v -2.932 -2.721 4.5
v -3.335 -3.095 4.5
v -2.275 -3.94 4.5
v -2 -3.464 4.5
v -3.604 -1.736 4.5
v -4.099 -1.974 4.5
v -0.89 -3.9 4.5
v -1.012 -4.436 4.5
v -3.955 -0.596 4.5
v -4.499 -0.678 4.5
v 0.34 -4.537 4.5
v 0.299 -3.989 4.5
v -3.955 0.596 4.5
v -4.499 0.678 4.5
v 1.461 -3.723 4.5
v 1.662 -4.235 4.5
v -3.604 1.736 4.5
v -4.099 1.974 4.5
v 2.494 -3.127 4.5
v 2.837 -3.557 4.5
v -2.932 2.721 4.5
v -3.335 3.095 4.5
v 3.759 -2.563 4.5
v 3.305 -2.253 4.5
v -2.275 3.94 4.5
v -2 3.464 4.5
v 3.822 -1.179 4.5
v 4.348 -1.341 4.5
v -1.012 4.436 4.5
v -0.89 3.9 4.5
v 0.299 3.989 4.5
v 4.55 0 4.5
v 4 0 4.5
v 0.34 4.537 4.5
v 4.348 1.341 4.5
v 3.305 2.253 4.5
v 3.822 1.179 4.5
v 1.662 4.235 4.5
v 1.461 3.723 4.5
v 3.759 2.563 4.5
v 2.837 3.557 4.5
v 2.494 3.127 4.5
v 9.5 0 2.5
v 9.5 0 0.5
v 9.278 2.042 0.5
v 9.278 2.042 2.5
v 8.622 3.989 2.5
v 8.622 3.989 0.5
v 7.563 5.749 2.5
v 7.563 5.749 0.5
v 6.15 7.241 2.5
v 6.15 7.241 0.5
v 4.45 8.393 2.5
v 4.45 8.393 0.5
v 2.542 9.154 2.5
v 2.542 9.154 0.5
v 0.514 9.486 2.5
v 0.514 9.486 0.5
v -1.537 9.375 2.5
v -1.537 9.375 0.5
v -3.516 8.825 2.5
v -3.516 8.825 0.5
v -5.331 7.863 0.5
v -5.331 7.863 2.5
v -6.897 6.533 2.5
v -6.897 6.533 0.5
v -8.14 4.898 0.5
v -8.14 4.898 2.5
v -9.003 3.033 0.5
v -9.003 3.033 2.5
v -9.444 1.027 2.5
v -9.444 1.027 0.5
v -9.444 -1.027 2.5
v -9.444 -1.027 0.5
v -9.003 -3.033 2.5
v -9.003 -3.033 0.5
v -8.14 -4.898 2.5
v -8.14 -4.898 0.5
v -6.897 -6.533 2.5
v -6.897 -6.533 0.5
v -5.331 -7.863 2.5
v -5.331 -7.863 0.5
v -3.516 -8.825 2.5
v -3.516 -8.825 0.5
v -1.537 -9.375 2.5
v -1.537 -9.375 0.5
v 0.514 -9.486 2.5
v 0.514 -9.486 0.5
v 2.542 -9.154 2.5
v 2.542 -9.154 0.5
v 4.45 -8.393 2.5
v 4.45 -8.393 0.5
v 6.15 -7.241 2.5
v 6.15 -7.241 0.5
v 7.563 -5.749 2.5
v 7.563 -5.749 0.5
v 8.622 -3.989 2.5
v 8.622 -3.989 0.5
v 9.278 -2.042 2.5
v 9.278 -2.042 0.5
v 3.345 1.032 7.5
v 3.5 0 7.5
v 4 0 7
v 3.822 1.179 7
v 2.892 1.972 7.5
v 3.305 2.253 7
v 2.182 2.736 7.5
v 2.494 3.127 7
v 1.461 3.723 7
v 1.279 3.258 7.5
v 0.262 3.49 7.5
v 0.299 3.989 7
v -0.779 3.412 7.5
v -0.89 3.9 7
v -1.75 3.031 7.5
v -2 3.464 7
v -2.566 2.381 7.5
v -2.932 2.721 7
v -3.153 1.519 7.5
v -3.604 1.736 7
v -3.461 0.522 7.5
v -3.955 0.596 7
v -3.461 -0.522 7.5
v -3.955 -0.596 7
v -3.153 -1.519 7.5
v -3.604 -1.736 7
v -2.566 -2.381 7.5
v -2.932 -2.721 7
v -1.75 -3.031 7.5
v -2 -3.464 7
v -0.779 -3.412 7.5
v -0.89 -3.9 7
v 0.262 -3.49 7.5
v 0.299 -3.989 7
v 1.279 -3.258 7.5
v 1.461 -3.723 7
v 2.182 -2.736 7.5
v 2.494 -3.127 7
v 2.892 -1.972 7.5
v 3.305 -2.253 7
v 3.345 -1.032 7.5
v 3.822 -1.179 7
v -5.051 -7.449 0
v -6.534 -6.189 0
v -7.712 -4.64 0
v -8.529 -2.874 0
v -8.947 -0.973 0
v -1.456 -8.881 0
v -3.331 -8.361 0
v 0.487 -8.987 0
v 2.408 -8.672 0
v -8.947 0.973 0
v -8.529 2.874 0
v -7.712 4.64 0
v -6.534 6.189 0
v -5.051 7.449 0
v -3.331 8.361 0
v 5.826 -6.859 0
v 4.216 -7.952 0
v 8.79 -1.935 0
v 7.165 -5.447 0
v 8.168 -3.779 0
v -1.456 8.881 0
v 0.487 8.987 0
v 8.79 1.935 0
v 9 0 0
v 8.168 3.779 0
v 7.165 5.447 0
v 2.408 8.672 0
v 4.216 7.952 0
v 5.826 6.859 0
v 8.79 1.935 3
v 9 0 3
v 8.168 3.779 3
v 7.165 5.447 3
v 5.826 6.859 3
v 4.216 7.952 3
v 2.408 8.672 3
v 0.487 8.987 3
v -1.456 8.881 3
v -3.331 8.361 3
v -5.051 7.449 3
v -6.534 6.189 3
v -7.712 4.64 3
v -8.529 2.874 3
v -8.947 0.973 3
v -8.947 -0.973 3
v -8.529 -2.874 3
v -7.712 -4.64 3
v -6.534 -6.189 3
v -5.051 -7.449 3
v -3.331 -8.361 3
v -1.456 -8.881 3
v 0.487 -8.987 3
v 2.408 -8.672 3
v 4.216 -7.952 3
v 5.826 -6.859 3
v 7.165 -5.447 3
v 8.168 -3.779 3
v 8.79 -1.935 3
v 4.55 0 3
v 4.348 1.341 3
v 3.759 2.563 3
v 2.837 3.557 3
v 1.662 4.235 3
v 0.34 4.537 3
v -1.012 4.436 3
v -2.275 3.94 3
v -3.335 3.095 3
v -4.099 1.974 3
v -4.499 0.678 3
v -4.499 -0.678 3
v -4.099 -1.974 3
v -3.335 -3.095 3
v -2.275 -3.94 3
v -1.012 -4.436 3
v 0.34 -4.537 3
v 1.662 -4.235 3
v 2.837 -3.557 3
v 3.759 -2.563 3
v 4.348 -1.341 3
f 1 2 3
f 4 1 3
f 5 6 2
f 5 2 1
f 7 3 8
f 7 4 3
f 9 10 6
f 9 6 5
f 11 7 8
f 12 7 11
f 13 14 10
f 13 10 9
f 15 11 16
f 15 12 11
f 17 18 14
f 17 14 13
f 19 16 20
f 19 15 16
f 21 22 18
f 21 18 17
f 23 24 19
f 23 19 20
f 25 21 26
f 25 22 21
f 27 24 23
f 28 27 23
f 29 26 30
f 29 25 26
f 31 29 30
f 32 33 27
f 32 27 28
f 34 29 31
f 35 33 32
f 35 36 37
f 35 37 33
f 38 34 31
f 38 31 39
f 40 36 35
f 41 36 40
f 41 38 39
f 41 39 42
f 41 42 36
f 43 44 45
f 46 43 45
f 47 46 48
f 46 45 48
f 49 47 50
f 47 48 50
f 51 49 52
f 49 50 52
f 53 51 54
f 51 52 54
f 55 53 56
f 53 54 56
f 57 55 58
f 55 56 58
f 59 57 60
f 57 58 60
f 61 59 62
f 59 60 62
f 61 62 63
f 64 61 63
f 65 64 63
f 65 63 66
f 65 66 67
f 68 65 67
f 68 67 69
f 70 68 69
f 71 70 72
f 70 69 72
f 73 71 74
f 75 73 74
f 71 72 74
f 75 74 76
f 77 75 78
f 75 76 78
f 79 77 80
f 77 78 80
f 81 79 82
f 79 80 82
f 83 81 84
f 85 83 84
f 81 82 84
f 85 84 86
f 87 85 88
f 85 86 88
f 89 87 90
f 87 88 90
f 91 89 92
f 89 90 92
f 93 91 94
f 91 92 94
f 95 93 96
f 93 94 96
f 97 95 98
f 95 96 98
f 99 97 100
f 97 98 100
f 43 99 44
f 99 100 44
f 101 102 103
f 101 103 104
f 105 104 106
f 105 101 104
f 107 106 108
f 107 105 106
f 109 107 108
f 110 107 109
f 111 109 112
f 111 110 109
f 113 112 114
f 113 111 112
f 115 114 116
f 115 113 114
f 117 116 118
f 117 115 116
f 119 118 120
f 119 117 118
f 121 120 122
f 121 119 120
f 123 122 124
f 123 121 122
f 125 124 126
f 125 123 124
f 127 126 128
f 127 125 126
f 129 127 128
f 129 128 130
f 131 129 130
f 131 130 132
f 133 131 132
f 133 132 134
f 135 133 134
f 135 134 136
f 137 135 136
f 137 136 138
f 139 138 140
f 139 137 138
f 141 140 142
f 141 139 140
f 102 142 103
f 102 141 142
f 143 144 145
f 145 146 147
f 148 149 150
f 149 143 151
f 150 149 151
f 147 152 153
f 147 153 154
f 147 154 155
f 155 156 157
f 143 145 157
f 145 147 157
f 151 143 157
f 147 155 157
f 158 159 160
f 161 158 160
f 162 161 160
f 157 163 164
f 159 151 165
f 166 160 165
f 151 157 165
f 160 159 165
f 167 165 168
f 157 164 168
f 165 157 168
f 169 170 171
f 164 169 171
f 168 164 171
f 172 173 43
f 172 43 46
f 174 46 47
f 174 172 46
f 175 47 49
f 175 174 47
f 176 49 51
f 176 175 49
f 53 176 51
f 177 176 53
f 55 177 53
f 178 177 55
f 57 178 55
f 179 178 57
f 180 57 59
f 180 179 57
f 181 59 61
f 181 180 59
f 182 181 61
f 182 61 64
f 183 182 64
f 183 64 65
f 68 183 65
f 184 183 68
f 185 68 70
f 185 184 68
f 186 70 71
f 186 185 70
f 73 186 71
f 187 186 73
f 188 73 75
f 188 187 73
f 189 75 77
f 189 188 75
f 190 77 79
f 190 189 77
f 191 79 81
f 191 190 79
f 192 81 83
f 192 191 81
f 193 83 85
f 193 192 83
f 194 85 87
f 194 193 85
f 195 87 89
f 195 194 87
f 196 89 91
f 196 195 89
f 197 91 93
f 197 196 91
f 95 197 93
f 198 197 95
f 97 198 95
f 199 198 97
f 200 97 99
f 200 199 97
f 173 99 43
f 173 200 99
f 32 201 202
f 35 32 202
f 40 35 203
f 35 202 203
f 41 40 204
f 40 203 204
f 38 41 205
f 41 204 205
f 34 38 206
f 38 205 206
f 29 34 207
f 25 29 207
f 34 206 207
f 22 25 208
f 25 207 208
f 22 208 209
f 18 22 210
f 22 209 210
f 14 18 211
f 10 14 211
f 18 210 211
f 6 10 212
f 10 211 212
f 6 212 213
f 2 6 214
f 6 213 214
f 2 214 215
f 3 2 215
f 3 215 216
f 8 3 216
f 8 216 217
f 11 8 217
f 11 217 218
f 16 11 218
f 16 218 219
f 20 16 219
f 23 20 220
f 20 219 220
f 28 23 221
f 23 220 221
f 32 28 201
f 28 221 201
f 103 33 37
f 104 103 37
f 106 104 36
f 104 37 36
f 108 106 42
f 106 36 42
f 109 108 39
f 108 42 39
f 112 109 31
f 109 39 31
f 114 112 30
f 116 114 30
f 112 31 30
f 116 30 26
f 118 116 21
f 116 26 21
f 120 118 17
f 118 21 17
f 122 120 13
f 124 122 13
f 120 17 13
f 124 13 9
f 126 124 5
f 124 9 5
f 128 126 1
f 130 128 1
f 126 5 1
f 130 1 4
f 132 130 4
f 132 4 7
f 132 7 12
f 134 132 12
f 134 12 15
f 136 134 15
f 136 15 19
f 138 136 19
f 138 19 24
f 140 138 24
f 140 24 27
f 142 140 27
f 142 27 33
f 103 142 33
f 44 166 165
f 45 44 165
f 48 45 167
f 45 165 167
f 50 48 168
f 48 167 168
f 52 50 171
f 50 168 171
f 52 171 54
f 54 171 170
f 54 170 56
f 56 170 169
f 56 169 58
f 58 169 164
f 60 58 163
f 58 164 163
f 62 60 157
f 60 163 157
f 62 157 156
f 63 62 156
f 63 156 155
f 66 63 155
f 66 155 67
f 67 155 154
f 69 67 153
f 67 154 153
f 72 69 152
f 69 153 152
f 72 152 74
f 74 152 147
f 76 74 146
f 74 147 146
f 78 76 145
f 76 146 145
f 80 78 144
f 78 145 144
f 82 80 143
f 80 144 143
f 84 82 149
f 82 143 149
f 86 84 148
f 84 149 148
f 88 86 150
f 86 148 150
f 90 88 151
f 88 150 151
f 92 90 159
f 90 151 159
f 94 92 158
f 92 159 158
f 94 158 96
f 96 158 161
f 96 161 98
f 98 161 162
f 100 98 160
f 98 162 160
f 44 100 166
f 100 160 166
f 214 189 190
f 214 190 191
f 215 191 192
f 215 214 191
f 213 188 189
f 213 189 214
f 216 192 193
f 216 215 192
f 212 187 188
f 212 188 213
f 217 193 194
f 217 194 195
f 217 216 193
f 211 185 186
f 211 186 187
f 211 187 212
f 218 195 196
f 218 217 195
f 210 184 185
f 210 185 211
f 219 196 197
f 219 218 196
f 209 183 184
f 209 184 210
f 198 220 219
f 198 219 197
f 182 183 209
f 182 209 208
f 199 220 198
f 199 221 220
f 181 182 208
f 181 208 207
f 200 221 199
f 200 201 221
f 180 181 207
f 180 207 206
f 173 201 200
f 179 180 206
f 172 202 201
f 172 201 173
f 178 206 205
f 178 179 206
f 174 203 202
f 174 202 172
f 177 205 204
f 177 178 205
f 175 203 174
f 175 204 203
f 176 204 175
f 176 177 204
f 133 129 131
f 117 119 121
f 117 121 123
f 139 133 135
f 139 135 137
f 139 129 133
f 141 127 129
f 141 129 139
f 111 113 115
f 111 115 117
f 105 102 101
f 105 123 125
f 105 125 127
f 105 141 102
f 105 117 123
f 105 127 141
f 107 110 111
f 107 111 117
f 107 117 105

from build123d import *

# Parameters (mm, degrees)
F0_R     = 9.5
F1_DEPTH = 3
F2_R     = 4
F3_DEPTH = 4.5
F4_SIZE  = 0.5
F5_R     = 4.55
F6_DEPTH = 1.5


with BuildPart() as f1:
    # F0 (on Top) → F1 (new body)
    with BuildSketch(Plane.XY):
        Circle(F0_R)
    extrude(amount=F1_DEPTH)

    # F2 (on face) → F3 (join)
    with BuildSketch(Plane.XY.offset(3)):
        Circle(F2_R)
    extrude(amount=F3_DEPTH)

    # F4
    f4_edges = [f1.edges().sort_by_distance(p)[0] for p in [
        (-4, 0, 7.5),
        (-9.5, 0, 3),
        (-9.5, 0, 0),
    ]]
    chamfer(f4_edges, length=F4_SIZE)

    # F5 (on face) → F6 (join)
    with BuildSketch(Plane.XY.offset(3)):
        Circle(F5_R)
    extrude(amount=F6_DEPTH)


solid = f1.part
